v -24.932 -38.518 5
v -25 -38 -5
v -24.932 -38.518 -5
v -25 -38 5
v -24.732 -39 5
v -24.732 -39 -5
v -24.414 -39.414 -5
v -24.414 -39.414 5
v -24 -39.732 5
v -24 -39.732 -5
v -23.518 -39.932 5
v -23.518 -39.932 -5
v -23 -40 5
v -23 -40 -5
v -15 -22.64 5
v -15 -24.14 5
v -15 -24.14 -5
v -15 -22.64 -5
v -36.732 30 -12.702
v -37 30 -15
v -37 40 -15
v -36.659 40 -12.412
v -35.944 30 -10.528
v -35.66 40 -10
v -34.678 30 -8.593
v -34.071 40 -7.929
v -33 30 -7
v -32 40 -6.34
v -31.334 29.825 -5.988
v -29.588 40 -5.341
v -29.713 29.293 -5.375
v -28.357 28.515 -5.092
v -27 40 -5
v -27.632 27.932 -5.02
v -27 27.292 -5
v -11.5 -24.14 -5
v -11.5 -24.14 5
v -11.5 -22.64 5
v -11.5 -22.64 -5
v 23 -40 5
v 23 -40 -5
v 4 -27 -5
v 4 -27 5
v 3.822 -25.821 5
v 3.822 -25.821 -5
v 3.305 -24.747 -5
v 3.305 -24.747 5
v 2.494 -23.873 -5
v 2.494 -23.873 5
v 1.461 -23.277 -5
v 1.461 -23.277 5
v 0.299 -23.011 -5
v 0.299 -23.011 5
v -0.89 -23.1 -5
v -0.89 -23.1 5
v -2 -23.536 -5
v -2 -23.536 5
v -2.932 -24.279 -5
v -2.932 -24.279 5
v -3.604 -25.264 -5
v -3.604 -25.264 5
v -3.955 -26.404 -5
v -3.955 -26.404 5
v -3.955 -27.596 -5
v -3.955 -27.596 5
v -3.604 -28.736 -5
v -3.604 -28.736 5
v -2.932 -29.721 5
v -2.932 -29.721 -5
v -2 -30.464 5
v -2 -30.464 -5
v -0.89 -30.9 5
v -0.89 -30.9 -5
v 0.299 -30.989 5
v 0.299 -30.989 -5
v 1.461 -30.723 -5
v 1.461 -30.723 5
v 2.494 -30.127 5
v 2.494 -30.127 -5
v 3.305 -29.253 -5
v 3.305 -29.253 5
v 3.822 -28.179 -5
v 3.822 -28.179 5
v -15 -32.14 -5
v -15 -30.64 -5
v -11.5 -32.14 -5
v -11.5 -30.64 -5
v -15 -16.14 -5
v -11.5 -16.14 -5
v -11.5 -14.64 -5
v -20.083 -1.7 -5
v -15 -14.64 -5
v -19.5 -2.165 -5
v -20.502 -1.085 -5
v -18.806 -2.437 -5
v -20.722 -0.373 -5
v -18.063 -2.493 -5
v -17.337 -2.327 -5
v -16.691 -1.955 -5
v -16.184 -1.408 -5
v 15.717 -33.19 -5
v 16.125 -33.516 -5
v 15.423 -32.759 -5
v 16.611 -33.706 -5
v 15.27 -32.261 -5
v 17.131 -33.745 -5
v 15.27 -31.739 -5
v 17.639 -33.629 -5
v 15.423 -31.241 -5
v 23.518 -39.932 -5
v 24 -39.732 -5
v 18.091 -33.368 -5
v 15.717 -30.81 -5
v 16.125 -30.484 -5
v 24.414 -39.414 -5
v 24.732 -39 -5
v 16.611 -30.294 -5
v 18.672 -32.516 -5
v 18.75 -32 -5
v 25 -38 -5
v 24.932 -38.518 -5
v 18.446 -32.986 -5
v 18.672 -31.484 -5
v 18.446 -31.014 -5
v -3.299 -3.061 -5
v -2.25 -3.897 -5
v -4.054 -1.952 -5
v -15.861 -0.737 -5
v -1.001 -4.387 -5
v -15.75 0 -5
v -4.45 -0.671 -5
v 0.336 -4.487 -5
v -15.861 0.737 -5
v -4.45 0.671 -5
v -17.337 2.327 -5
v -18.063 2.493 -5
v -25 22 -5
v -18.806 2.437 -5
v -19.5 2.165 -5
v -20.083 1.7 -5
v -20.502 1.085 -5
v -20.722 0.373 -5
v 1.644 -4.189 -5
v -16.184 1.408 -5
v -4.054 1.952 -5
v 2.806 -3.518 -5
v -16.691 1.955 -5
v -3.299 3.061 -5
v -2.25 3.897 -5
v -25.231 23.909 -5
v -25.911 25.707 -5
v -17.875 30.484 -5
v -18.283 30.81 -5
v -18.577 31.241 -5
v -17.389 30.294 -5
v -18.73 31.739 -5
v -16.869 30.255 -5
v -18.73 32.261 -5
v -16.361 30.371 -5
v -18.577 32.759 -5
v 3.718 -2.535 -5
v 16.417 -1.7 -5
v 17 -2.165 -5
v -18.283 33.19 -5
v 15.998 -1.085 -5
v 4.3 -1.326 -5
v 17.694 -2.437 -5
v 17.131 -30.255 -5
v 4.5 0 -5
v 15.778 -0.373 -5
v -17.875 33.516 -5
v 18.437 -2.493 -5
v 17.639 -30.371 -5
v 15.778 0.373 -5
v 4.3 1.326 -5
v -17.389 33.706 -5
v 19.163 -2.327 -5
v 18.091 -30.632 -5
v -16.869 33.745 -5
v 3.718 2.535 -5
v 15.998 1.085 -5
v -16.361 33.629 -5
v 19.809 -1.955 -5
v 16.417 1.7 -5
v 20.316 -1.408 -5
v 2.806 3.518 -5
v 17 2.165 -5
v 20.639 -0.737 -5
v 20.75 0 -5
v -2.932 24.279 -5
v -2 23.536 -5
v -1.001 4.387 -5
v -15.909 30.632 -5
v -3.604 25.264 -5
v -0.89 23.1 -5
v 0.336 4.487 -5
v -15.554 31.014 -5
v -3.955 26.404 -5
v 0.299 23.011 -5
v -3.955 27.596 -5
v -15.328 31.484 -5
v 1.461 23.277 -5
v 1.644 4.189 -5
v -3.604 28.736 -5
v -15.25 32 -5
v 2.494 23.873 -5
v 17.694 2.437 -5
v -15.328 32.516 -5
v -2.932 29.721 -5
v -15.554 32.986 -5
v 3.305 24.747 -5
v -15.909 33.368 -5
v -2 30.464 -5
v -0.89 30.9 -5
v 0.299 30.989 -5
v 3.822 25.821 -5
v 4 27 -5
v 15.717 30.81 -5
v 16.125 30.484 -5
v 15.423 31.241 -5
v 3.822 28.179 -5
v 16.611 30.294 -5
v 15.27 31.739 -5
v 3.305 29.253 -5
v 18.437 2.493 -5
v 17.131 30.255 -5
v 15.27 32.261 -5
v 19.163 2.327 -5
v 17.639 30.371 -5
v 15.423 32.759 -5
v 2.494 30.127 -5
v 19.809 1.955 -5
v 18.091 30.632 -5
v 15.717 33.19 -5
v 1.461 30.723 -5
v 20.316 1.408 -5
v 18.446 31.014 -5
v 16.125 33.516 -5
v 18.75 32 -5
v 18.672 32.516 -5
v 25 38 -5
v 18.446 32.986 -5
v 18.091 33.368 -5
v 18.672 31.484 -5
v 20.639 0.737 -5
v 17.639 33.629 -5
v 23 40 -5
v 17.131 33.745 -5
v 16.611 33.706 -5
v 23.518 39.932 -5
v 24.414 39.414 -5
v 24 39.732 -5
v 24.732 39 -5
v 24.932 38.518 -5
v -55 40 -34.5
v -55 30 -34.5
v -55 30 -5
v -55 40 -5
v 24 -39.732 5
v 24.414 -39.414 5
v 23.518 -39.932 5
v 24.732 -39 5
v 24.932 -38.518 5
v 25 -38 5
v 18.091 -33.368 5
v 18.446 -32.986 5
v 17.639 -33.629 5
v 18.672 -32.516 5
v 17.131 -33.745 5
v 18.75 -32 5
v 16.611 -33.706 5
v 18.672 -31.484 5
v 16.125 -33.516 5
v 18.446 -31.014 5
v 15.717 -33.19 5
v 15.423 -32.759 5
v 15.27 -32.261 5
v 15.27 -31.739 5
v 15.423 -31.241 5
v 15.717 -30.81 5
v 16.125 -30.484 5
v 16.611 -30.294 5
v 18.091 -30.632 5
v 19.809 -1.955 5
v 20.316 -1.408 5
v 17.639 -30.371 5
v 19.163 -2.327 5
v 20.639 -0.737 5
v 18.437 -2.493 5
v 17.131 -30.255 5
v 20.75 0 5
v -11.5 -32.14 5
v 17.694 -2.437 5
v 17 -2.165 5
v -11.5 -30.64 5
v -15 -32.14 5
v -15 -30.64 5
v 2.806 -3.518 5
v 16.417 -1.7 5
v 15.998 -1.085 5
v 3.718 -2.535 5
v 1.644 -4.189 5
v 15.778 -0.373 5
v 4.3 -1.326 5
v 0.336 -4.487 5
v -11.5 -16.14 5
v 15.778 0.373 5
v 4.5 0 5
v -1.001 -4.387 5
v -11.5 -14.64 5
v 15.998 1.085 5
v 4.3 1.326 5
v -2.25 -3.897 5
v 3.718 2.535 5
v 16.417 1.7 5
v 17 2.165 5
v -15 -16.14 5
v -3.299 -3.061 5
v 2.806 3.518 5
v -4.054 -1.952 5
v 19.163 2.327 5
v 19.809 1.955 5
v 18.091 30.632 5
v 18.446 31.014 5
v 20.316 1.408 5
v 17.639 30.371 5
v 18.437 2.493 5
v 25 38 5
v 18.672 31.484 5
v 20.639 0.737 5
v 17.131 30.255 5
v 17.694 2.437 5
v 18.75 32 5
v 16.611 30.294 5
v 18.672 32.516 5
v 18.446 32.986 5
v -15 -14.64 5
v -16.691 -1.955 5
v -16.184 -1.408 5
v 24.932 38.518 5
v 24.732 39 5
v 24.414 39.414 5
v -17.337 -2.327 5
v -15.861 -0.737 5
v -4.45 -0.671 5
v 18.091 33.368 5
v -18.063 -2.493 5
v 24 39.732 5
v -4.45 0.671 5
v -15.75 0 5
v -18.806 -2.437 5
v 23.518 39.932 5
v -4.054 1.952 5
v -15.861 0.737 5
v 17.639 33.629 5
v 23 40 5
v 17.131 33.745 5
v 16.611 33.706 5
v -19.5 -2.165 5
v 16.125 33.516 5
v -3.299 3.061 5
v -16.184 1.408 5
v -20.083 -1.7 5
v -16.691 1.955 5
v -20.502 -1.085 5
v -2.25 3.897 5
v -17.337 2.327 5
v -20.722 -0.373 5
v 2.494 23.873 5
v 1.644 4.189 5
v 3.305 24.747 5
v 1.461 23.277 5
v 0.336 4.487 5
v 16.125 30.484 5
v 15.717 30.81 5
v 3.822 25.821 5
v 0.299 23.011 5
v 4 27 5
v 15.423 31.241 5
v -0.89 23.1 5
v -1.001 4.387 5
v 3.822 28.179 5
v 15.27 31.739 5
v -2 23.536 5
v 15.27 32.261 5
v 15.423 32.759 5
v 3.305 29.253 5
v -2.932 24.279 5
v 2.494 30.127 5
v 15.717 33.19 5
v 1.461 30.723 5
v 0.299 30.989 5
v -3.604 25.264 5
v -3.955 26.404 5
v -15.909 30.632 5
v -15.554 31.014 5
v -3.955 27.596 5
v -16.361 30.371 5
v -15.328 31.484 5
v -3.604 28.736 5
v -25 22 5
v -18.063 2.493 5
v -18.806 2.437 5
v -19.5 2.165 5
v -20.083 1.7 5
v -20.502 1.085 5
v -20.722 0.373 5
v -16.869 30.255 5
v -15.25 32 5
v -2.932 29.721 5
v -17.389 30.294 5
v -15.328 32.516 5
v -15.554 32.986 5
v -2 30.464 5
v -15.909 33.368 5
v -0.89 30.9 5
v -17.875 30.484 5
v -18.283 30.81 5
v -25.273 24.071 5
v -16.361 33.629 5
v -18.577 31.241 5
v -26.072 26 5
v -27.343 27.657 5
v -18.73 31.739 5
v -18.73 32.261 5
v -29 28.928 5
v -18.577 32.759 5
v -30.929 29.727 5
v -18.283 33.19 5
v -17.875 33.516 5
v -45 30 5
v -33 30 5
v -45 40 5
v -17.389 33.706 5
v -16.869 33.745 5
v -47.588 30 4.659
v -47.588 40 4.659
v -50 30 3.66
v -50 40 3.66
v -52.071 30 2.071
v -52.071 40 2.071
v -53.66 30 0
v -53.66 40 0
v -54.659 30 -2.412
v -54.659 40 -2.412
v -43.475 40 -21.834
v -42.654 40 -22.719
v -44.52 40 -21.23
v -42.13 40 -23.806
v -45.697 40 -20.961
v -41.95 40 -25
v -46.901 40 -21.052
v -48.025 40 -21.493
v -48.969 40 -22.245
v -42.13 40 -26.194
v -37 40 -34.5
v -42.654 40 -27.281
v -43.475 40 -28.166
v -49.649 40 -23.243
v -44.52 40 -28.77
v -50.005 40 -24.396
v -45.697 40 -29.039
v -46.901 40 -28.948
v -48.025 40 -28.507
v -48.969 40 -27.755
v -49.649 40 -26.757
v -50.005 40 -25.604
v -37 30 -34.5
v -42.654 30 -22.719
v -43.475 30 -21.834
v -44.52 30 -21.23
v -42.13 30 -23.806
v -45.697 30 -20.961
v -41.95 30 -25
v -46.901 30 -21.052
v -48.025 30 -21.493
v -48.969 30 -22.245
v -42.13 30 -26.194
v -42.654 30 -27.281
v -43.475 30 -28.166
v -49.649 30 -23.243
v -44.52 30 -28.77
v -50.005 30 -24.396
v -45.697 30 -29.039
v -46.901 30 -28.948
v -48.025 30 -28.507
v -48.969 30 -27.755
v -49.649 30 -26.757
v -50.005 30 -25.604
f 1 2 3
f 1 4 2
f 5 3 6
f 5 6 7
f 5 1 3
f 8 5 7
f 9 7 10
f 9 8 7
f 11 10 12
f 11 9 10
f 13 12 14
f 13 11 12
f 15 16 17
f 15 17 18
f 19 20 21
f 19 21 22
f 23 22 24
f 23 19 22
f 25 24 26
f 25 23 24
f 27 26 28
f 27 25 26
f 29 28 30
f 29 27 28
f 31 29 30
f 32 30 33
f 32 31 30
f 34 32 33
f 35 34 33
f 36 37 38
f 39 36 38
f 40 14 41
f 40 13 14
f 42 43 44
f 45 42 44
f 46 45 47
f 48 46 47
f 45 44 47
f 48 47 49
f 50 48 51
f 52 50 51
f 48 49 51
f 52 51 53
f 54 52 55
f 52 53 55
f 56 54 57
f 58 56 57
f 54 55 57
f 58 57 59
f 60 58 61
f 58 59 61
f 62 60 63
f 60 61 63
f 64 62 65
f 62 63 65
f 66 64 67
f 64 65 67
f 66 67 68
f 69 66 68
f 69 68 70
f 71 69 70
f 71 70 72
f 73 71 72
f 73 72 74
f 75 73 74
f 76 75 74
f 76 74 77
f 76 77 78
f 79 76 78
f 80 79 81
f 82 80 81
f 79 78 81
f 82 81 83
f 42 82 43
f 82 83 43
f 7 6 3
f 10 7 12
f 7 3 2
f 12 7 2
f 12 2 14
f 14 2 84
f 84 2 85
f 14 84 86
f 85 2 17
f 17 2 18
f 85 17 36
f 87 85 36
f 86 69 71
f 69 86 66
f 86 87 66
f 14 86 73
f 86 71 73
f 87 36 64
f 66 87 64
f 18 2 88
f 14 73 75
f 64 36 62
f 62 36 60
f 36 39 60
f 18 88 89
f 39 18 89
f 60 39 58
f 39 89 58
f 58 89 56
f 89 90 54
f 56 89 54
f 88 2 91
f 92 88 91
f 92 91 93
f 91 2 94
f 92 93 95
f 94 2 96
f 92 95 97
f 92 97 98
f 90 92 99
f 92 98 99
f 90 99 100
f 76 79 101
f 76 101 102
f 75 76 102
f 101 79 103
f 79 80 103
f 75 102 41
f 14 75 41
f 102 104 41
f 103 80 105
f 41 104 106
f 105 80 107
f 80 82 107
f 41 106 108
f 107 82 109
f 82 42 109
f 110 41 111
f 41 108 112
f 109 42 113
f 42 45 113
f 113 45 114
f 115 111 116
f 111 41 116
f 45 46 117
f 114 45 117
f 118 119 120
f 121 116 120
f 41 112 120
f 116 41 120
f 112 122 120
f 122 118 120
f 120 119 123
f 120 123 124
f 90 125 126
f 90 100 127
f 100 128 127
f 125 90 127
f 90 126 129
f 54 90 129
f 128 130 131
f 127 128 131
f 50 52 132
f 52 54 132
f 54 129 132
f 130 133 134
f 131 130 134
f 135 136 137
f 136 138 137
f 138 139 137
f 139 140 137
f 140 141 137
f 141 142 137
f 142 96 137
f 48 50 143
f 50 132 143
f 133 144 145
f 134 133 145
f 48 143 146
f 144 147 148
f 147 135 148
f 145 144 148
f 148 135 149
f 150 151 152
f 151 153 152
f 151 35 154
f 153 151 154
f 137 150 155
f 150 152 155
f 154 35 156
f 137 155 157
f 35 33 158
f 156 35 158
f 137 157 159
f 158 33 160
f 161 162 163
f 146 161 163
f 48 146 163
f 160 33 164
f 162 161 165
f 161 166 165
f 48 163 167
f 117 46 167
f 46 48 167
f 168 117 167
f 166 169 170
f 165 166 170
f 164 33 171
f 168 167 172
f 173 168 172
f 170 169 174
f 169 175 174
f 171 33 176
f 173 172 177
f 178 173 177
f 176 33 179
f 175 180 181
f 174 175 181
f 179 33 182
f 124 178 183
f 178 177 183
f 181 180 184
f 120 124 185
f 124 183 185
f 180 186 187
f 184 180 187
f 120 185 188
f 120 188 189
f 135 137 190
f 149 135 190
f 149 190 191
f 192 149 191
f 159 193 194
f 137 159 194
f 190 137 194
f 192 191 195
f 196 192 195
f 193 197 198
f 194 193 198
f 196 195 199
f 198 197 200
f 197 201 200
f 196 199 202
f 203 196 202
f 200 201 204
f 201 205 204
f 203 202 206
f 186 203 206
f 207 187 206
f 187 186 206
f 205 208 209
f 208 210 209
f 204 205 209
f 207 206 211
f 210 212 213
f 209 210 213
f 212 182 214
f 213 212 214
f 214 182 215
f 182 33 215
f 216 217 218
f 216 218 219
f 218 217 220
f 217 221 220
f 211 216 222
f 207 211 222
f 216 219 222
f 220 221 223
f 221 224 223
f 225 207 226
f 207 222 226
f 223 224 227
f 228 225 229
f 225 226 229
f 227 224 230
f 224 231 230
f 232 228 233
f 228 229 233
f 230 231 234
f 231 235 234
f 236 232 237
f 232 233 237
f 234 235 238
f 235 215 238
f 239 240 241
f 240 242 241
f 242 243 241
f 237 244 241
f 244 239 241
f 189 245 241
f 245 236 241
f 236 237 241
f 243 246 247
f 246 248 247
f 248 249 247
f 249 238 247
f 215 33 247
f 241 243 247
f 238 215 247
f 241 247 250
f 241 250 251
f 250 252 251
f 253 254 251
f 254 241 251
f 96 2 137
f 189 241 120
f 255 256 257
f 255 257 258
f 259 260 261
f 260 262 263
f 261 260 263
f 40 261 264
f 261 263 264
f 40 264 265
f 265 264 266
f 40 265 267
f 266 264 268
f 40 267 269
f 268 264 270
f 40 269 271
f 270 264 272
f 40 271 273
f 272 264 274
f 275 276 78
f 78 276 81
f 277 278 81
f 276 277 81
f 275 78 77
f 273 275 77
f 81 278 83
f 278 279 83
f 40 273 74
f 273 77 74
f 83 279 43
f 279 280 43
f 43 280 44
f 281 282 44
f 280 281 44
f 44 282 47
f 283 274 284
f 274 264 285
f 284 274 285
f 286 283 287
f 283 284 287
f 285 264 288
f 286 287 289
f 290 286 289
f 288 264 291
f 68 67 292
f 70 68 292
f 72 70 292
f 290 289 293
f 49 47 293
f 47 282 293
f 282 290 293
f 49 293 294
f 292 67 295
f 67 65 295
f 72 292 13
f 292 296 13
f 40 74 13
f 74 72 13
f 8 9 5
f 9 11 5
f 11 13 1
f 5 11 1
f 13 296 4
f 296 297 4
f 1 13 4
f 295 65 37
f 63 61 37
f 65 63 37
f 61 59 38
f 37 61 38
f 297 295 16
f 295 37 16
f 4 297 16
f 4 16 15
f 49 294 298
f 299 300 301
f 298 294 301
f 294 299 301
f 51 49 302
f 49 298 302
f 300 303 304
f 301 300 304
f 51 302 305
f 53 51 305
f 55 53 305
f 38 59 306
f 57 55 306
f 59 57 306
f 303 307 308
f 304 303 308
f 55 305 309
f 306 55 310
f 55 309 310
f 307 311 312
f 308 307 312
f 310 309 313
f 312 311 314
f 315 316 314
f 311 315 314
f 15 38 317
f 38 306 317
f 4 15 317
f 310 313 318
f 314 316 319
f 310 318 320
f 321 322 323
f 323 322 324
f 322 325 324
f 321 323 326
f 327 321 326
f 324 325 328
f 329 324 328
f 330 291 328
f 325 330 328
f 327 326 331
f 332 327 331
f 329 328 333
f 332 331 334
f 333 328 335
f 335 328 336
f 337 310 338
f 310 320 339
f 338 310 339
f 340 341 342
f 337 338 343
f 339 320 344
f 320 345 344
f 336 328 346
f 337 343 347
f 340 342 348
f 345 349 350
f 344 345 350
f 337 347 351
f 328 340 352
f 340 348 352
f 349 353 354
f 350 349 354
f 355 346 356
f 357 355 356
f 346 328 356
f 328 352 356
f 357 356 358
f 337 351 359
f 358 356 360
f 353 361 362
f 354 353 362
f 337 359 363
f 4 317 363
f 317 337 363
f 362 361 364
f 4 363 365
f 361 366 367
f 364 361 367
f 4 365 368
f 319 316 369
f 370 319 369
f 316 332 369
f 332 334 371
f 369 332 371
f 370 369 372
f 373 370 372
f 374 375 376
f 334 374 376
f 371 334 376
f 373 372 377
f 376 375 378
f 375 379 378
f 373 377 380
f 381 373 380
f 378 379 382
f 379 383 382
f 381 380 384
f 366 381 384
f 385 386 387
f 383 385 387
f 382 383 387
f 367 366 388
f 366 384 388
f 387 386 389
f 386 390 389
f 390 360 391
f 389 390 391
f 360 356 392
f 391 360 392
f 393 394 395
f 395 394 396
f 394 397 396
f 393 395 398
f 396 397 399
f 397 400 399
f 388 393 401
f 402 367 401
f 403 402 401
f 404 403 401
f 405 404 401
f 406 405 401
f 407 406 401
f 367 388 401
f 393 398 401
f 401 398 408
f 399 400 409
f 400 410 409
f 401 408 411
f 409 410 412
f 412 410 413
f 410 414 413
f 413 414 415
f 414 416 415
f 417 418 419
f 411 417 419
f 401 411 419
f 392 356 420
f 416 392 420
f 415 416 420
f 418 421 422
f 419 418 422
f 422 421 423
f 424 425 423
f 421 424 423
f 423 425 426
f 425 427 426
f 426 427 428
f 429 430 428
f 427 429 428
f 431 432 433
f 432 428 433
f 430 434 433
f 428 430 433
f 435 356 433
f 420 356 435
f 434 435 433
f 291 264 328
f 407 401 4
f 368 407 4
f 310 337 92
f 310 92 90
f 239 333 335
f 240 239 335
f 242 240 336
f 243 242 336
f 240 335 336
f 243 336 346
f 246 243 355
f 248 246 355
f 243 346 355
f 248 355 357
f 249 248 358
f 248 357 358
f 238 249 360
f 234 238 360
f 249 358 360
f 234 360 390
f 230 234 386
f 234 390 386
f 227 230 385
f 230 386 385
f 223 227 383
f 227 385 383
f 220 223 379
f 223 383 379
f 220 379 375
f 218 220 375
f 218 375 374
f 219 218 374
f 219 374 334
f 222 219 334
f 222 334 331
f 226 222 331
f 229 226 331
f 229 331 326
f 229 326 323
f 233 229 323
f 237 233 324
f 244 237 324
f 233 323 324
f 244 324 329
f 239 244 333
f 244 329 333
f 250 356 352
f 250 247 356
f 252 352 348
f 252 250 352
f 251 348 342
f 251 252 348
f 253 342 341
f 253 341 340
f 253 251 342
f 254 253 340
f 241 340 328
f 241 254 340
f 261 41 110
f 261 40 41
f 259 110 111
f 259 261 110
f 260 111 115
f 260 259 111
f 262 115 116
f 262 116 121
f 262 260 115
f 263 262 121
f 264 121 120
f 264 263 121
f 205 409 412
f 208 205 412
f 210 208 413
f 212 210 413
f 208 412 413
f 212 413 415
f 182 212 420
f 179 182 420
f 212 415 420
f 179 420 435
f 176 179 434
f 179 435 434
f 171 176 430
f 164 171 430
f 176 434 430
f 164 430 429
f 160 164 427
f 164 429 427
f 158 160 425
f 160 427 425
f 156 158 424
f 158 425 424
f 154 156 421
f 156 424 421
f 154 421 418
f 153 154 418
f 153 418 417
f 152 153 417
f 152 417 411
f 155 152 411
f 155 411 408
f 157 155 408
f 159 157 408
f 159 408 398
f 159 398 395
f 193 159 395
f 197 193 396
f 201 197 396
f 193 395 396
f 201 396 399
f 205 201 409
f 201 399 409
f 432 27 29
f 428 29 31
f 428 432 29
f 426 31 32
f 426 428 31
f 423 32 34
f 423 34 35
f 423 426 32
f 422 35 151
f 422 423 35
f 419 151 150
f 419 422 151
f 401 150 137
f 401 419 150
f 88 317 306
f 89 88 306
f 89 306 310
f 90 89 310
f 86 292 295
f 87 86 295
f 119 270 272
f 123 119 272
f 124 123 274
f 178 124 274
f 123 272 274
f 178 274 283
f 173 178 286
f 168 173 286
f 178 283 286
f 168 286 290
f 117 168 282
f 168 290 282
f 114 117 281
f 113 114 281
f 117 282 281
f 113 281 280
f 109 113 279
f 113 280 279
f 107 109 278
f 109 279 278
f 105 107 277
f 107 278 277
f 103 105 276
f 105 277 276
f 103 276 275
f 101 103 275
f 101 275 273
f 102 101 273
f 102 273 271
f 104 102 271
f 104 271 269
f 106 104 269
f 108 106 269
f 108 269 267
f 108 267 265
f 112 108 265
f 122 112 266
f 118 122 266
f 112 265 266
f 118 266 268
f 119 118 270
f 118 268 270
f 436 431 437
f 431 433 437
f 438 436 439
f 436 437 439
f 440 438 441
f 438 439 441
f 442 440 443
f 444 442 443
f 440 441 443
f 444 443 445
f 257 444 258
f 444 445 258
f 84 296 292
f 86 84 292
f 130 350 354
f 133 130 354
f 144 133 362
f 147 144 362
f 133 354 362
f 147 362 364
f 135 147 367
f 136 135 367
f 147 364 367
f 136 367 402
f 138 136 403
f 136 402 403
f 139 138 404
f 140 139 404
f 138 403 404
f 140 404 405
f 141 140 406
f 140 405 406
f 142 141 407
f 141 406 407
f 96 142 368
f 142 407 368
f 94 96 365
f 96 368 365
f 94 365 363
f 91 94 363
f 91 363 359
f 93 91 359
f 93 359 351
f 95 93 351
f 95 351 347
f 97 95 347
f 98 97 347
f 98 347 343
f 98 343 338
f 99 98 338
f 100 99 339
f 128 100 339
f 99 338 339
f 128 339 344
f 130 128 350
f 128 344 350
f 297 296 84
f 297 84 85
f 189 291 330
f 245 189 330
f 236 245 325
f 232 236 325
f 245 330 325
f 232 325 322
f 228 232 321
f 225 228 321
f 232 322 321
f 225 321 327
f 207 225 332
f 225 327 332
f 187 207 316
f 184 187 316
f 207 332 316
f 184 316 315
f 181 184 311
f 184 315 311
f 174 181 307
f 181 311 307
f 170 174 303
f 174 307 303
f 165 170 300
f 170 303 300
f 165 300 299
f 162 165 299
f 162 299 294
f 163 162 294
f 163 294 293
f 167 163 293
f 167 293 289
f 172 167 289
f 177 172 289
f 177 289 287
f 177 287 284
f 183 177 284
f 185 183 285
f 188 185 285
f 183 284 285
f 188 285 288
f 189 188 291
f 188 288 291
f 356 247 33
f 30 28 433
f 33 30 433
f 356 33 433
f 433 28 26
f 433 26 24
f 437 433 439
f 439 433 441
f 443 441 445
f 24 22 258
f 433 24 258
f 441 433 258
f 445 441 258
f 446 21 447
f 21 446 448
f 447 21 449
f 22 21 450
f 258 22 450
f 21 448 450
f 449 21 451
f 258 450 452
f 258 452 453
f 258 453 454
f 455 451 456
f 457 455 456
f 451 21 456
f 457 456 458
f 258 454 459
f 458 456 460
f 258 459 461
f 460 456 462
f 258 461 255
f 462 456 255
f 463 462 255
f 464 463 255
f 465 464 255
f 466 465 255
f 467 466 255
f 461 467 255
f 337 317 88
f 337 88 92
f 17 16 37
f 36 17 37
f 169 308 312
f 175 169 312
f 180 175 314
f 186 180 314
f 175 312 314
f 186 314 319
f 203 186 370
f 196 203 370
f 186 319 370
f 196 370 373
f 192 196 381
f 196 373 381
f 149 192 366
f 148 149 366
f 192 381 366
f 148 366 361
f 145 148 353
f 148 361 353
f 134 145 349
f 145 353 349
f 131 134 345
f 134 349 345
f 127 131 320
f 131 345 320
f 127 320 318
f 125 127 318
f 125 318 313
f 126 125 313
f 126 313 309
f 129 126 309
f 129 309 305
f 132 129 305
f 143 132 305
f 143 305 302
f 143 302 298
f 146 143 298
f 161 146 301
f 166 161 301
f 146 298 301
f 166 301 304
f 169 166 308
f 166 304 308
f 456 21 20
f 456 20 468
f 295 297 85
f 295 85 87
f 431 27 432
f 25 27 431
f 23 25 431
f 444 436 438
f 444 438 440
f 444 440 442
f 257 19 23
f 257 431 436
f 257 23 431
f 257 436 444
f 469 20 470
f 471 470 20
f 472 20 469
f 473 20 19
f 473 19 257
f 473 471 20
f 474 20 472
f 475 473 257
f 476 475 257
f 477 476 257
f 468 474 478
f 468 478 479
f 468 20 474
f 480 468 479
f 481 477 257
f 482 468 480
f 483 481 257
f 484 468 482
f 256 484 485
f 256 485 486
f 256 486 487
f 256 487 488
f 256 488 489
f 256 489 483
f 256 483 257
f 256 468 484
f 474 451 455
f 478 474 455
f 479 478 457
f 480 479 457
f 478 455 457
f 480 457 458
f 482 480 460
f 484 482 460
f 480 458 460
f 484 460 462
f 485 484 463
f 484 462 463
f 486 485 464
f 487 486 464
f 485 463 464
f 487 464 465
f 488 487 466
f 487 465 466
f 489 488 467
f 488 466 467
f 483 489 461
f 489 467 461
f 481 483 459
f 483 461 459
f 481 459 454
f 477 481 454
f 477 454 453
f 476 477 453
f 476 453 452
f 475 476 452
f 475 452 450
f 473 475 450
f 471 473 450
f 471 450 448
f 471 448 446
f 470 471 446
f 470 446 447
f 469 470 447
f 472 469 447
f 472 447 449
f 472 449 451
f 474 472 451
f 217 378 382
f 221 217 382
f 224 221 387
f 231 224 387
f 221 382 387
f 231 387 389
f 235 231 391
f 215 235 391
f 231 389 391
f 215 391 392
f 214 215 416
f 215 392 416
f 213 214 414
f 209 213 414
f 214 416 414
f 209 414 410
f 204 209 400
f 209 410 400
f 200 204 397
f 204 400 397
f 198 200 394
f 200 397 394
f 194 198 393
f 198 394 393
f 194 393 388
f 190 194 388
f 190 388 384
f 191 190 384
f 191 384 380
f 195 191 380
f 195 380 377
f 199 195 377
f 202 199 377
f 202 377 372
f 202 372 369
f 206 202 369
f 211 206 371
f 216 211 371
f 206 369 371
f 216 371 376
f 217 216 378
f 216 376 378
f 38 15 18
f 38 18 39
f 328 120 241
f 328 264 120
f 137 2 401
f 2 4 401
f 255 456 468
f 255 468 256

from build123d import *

# Parameters (mm, degrees)
ESBO_O1_W                     = 50
ESBO_O1_H                     = 80
RESSALTO_EXTRUS_O1_DEPTH      = 5
ESBO_O2_R                     = 4.5
ESBO_O2_R_2                   = 4
ESBO_O2_R_3                   = 2.5
CORTE_EXTRUS_O1_DEPTH         = 10
ESBO_O3_W                     = 3.5
ESBO_O3_H                     = 1.5
CORTE_EXTRUS_O2_DEPTH         = 22
ESBO_O4_R                     = 1.75
CORTE_EXTRUS_O3_DEPTH         = 10
FILETE1_R                     = 2
ESBO_O6_W                     = 30
ESBO_O6_H                     = 10
RESSALTO_EXTRUS_O2_DEPTH      = 29.5
RESSALTO_EXTRUS_O2_DEPTH_BACK = 10
ESBO_O7_R                     = 4.05
CORTE_EXTRUS_O4_DEPTH         = 50
ESBO_O8_W                     = 12
ESBO_O8_H                     = 29.5
CORTE_EXTRUS_O5_DEPTH         = 50
FILETE2_R                     = 10
FILETE3_R                     = 8


with BuildPart() as part:
    # Esboço1 → Ressalto-extrusão1 (new body, symmetric)
    with BuildSketch(Plane.XY):
        Rectangle(ESBO_O1_W, ESBO_O1_H)
    extrude(amount=RESSALTO_EXTRUS_O1_DEPTH, both=True)

    # Esboço2 → Corte-extrusão1 (cut)
    with BuildSketch(Plane.XY.offset(5)):
        Circle(ESBO_O2_R)
        with Locations((0, 27)):
            Circle(ESBO_O2_R_2)
        with Locations((0, -27)):
            Circle(ESBO_O2_R_2)
        with Locations((18.25, 0)):
            Circle(ESBO_O2_R_3)
        with Locations((-18.25, 0)):
            Circle(ESBO_O2_R_3)
    extrude(amount=-CORTE_EXTRUS_O1_DEPTH, mode=Mode.SUBTRACT)

    # Esboço3 → Corte-extrusão2 (cut)
    with BuildSketch(Plane.XY.offset(5)):
        with Locations((-13.25, -31.39)):
            Rectangle(ESBO_O3_W, ESBO_O3_H)
        with Locations((-13.25, -23.39)):
            Rectangle(ESBO_O3_W, ESBO_O3_H)
        with Locations((-13.25, -15.39)):
            Rectangle(ESBO_O3_W, ESBO_O3_H)
    extrude(amount=-CORTE_EXTRUS_O2_DEPTH, mode=Mode.SUBTRACT)

    # Esboço4 → Corte-extrusão3 (cut)
    with BuildSketch(Plane.XY.offset(5)):
        with Locations((-17, 32)):
            Circle(ESBO_O4_R)
        with Locations((17, 32)):
            Circle(ESBO_O4_R)
        with Locations((17, -32)):
            Circle(ESBO_O4_R)
    extrude(amount=-CORTE_EXTRUS_O3_DEPTH, mode=Mode.SUBTRACT)

    # Filete1
    filete1_edges = [part.edges().sort_by_distance(p)[0] for p in [
        (25, -40, 0),
        (-25, -40, 0),
        (25, 40, 0),
    ]]
    fillet(filete1_edges, radius=FILETE1_R)

    # Esboço6 → Ressalto-extrusão2 (add, two sides)
    with BuildSketch(Plane(origin=(0, 0, -5), x_dir=(-1, 0, 0), z_dir=(0, 0, -1))) as ressalto_extrus_o2_sk:
        with Locations((40, 35)):
            Rectangle(ESBO_O6_W, ESBO_O6_H)
    extrude(amount=RESSALTO_EXTRUS_O2_DEPTH)
    extrude(ressalto_extrus_o2_sk.sketch, amount=-RESSALTO_EXTRUS_O2_DEPTH_BACK)

    # Esboço7 → Corte-extrusão4 (cut)
    with BuildSketch(Plane(origin=(0, 40, 0), x_dir=(1, 0, 0), z_dir=(0, 1, 0))):
        with Locations((-46, 25)):
            Circle(ESBO_O7_R)
    extrude(amount=-CORTE_EXTRUS_O4_DEPTH, mode=Mode.SUBTRACT)

    # Esboço8 → Corte-extrusão5 (cut)
    with BuildSketch(Plane(origin=(0, 40, 0), x_dir=(1, 0, 0), z_dir=(0, 1, 0))):
        with Locations((-31, 19.75)):
            Rectangle(ESBO_O8_W, ESBO_O8_H)
    extrude(amount=-CORTE_EXTRUS_O5_DEPTH, mode=Mode.SUBTRACT)

    # Filete2
    filete2_edges = [part.edges().sort_by_distance(p)[0] for p in [
        (-55, 35, 5),
        (-37, 35, -5),
    ]]
    fillet(filete2_edges, radius=FILETE2_R)

    # Filete3
    filete3_edges = [part.edges().sort_by_distance(p)[0] for p in [
        (-25, 30, 0),
    ]]
    fillet(filete3_edges, radius=FILETE3_R)


solid = part.part
